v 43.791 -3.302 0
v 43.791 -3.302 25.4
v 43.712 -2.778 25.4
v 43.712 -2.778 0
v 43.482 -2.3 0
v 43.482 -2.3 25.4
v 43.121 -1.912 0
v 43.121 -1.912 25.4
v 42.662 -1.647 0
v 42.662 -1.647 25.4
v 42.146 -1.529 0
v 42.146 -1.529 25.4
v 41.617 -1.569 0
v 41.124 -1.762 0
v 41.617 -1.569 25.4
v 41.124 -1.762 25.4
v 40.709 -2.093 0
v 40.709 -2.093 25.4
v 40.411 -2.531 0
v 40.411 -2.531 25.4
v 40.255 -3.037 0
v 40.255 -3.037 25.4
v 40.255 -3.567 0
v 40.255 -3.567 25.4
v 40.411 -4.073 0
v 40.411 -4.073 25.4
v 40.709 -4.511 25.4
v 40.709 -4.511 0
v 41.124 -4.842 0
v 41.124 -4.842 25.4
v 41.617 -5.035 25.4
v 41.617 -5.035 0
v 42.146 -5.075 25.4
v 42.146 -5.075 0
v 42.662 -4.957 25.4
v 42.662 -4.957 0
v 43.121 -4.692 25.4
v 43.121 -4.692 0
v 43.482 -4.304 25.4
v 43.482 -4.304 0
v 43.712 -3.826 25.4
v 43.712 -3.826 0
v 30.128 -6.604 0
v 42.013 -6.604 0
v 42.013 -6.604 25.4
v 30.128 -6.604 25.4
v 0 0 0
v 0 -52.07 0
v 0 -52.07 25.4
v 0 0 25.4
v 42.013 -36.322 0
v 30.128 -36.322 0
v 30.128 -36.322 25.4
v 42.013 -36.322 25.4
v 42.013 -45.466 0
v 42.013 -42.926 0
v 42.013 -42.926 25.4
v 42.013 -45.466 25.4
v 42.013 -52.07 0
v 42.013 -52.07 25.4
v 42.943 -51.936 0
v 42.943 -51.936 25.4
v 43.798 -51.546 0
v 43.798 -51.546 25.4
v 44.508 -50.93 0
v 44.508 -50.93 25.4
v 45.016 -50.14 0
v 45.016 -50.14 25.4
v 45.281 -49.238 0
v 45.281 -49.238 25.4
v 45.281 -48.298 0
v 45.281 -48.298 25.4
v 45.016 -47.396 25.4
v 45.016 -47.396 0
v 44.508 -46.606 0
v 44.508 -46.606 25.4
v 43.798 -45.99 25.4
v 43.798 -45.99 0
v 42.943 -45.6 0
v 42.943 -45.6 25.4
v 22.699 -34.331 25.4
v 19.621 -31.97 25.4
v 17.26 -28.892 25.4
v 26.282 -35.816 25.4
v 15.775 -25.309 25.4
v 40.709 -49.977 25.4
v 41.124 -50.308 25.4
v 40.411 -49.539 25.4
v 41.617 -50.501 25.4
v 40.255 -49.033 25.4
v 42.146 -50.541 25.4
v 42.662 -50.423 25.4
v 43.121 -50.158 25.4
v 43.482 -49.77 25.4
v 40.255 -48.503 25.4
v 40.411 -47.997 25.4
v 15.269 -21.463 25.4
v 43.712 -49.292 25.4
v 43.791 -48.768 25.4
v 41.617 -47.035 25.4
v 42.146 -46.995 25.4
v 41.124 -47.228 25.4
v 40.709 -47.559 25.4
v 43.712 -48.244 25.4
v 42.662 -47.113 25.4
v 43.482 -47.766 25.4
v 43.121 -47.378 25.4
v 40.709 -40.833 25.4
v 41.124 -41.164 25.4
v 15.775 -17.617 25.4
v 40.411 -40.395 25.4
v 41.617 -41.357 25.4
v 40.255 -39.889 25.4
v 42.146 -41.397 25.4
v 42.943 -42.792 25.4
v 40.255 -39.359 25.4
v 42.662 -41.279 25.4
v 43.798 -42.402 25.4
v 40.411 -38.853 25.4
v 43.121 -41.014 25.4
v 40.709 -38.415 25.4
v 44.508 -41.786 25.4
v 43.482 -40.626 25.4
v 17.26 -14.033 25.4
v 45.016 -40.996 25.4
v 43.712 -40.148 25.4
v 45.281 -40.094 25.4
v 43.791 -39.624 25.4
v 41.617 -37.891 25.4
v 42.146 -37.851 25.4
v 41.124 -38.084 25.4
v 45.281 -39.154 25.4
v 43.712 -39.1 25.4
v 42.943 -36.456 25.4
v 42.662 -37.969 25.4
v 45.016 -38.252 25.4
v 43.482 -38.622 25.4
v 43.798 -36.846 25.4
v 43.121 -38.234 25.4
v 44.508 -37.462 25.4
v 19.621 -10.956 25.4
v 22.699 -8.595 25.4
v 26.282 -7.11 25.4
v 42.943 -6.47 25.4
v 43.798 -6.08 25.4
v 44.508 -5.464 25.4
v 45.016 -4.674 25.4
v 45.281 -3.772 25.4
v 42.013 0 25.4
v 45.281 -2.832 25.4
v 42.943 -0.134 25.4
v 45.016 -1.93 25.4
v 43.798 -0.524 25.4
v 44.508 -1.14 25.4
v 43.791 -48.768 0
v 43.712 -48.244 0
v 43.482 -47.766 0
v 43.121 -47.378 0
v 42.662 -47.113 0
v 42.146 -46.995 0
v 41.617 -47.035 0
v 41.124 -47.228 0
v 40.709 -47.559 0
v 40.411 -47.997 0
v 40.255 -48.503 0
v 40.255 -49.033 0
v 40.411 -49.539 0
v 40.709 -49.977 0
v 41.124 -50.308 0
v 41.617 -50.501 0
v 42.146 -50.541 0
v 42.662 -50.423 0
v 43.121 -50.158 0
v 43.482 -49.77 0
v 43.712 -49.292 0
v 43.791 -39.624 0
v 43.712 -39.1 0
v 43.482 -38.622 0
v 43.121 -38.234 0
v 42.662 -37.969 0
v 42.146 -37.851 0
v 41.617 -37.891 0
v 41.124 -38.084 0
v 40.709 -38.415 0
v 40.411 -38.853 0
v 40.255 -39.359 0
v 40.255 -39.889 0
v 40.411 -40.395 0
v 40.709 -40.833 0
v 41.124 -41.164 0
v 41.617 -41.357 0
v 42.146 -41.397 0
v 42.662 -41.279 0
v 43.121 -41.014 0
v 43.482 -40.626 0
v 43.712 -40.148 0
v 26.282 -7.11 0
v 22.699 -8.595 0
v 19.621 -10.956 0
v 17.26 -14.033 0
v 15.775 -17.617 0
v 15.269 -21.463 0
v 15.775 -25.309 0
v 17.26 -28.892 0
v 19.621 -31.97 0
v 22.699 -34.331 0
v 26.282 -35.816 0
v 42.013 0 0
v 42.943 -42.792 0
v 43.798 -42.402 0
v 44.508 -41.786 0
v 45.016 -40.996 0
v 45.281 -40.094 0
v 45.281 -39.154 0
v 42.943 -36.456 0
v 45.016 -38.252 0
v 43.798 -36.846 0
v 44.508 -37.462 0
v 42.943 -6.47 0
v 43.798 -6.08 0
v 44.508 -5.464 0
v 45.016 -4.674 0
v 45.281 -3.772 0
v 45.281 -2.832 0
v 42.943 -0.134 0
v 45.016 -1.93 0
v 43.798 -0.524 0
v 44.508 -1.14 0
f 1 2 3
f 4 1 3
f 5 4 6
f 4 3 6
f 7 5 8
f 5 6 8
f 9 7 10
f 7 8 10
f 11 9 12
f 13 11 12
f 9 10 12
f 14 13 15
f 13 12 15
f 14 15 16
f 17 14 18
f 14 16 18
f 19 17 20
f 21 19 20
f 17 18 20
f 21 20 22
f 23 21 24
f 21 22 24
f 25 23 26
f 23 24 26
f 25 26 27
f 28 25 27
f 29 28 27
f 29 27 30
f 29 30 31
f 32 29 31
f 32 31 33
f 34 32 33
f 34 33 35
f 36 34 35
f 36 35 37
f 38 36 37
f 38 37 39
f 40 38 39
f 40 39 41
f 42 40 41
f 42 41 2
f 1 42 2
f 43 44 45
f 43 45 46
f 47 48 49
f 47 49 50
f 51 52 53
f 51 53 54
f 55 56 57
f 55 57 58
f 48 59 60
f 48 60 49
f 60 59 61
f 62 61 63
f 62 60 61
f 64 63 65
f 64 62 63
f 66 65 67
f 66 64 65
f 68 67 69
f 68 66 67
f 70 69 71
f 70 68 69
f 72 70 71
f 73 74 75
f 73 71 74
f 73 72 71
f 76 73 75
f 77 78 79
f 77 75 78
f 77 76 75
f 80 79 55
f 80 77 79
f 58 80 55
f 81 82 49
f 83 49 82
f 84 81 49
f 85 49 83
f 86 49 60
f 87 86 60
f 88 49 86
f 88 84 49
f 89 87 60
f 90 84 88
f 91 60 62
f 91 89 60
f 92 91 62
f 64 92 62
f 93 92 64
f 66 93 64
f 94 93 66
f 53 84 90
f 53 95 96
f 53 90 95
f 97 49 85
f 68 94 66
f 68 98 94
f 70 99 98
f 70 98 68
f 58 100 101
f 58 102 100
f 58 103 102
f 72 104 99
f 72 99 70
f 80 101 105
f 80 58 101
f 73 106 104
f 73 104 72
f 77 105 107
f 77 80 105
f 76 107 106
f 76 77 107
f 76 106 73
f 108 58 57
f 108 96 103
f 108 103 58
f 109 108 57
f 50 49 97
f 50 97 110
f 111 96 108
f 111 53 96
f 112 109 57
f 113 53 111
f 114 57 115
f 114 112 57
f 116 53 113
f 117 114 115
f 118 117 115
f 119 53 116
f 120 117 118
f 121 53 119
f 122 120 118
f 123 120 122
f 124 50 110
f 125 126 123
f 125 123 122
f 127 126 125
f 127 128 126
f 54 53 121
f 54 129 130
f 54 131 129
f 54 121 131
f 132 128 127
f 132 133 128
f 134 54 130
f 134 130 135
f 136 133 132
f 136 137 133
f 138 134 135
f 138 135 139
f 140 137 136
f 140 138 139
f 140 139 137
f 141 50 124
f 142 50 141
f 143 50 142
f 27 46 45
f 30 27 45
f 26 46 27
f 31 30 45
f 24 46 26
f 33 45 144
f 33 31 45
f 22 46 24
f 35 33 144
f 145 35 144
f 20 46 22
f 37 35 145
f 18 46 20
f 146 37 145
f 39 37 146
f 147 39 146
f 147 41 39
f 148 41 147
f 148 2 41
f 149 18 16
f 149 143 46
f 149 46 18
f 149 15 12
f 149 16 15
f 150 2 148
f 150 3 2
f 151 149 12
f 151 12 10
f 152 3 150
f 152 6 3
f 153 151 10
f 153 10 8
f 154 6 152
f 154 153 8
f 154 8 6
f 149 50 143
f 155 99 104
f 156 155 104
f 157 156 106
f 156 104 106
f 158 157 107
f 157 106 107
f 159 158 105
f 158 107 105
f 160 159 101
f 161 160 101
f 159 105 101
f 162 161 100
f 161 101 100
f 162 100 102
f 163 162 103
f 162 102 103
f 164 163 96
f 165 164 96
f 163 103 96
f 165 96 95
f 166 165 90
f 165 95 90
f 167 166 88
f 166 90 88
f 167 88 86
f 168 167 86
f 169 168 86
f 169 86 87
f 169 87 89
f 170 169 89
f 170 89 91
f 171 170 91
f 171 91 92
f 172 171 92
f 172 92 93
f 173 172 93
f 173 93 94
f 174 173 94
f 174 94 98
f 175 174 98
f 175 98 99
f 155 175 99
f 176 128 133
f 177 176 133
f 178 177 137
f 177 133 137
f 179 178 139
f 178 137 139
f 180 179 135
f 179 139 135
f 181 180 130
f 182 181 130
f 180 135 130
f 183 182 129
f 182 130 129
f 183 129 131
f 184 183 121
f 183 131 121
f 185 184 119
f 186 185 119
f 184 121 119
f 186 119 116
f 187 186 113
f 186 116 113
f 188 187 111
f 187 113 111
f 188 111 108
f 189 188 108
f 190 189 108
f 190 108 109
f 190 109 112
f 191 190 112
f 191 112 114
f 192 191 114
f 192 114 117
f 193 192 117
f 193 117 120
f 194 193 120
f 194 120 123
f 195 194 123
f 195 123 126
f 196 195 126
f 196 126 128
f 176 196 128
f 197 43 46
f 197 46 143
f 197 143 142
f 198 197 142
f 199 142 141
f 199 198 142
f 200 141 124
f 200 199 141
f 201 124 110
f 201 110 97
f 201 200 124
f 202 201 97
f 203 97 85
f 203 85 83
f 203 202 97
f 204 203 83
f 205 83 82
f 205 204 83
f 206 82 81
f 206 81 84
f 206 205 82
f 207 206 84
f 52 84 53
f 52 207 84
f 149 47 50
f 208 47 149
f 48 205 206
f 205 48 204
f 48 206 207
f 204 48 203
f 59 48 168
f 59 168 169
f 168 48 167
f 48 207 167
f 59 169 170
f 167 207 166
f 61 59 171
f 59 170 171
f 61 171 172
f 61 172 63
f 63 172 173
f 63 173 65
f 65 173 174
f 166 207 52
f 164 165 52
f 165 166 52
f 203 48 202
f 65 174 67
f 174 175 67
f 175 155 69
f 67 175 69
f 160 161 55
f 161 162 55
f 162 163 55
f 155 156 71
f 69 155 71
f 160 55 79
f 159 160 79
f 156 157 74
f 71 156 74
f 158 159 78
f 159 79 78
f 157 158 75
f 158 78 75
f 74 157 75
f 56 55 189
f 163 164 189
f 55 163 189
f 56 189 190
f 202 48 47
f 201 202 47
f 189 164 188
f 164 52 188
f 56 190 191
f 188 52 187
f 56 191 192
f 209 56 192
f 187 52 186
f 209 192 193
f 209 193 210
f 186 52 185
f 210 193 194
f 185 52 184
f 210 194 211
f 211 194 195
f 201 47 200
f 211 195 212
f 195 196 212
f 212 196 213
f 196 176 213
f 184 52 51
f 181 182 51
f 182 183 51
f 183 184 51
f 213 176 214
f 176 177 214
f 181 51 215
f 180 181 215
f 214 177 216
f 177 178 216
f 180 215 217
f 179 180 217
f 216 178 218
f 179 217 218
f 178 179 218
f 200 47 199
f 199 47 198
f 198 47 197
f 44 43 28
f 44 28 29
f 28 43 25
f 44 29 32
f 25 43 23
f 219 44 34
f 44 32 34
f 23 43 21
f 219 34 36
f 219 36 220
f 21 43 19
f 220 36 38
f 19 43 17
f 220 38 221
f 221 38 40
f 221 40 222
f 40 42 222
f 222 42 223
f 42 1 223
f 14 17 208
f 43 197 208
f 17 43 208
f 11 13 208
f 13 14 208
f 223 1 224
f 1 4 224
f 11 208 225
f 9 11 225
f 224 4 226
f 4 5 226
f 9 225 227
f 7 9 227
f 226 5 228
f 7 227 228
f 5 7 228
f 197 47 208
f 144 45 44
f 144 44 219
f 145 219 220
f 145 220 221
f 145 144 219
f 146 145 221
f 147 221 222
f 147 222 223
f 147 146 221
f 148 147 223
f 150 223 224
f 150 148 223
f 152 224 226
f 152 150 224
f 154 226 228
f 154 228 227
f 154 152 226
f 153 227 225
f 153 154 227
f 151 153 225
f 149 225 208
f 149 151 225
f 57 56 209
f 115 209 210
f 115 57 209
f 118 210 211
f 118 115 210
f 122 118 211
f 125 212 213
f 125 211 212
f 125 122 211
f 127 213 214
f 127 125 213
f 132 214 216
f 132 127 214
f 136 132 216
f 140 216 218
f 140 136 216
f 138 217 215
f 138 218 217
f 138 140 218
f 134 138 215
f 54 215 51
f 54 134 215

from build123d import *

# Parameters (mm, degrees)
BOSS_EXTRUDE1_DEPTH = 25.4
SKETCH4_R           = 3.302
BOSS_EXTRUDE2_DEPTH = 25.4
SKETCH6_R           = 1.778
CUT_EXTRUDE1_DEPTH  = 74.551770003


with BuildPart() as part:
    # Sketch3 → Boss-Extrude1 (new body)
    with BuildSketch(Plane.XY):
        with BuildLine():
            Line((42.012655142, -6.604), (30.128190046, -6.604))
            ThreePointArc((30.128190046, -6.604), (15.269190046, -21.463), (30.128190046, -36.322))
            Line((30.128190046, -36.322), (42.012655142, -36.322))
            Line((42.012655142, -36.322), (42.012655142, -52.07))
            Line((42.012655142, -52.07), (0, -52.07))
            Line((0, -52.07), (0, 0))
            Line((0, 0), (42.012655142, 0))
            Line((42.012655142, 0), (42.012655142, -6.604))
        make_face()
    extrude(amount=BOSS_EXTRUDE1_DEPTH)

    # Sketch4 → Boss-Extrude2 (add)
    with BuildSketch(Plane.XY.offset(25.4)):
        with Locations((42.012655142, -3.302)):
            Circle(SKETCH4_R)
        with Locations((42.012655142, -39.624)):
            Circle(SKETCH4_R)
        with Locations((42.012655142, -48.768)):
            Circle(SKETCH4_R)
    extrude(amount=-BOSS_EXTRUDE2_DEPTH)

    # Sketch6 → Cut-Extrude1 (cut, through all)
    with BuildSketch(Plane.XY.offset(25.4)):
        with Locations((42.012655142, -3.302)):
            Circle(SKETCH6_R)
        with Locations((42.012655142, -39.624)):
            Circle(SKETCH6_R)
        with Locations((42.012655142, -48.768)):
            Circle(SKETCH6_R)
    extrude(amount=-CUT_EXTRUDE1_DEPTH, mode=Mode.SUBTRACT)


solid = part.part
